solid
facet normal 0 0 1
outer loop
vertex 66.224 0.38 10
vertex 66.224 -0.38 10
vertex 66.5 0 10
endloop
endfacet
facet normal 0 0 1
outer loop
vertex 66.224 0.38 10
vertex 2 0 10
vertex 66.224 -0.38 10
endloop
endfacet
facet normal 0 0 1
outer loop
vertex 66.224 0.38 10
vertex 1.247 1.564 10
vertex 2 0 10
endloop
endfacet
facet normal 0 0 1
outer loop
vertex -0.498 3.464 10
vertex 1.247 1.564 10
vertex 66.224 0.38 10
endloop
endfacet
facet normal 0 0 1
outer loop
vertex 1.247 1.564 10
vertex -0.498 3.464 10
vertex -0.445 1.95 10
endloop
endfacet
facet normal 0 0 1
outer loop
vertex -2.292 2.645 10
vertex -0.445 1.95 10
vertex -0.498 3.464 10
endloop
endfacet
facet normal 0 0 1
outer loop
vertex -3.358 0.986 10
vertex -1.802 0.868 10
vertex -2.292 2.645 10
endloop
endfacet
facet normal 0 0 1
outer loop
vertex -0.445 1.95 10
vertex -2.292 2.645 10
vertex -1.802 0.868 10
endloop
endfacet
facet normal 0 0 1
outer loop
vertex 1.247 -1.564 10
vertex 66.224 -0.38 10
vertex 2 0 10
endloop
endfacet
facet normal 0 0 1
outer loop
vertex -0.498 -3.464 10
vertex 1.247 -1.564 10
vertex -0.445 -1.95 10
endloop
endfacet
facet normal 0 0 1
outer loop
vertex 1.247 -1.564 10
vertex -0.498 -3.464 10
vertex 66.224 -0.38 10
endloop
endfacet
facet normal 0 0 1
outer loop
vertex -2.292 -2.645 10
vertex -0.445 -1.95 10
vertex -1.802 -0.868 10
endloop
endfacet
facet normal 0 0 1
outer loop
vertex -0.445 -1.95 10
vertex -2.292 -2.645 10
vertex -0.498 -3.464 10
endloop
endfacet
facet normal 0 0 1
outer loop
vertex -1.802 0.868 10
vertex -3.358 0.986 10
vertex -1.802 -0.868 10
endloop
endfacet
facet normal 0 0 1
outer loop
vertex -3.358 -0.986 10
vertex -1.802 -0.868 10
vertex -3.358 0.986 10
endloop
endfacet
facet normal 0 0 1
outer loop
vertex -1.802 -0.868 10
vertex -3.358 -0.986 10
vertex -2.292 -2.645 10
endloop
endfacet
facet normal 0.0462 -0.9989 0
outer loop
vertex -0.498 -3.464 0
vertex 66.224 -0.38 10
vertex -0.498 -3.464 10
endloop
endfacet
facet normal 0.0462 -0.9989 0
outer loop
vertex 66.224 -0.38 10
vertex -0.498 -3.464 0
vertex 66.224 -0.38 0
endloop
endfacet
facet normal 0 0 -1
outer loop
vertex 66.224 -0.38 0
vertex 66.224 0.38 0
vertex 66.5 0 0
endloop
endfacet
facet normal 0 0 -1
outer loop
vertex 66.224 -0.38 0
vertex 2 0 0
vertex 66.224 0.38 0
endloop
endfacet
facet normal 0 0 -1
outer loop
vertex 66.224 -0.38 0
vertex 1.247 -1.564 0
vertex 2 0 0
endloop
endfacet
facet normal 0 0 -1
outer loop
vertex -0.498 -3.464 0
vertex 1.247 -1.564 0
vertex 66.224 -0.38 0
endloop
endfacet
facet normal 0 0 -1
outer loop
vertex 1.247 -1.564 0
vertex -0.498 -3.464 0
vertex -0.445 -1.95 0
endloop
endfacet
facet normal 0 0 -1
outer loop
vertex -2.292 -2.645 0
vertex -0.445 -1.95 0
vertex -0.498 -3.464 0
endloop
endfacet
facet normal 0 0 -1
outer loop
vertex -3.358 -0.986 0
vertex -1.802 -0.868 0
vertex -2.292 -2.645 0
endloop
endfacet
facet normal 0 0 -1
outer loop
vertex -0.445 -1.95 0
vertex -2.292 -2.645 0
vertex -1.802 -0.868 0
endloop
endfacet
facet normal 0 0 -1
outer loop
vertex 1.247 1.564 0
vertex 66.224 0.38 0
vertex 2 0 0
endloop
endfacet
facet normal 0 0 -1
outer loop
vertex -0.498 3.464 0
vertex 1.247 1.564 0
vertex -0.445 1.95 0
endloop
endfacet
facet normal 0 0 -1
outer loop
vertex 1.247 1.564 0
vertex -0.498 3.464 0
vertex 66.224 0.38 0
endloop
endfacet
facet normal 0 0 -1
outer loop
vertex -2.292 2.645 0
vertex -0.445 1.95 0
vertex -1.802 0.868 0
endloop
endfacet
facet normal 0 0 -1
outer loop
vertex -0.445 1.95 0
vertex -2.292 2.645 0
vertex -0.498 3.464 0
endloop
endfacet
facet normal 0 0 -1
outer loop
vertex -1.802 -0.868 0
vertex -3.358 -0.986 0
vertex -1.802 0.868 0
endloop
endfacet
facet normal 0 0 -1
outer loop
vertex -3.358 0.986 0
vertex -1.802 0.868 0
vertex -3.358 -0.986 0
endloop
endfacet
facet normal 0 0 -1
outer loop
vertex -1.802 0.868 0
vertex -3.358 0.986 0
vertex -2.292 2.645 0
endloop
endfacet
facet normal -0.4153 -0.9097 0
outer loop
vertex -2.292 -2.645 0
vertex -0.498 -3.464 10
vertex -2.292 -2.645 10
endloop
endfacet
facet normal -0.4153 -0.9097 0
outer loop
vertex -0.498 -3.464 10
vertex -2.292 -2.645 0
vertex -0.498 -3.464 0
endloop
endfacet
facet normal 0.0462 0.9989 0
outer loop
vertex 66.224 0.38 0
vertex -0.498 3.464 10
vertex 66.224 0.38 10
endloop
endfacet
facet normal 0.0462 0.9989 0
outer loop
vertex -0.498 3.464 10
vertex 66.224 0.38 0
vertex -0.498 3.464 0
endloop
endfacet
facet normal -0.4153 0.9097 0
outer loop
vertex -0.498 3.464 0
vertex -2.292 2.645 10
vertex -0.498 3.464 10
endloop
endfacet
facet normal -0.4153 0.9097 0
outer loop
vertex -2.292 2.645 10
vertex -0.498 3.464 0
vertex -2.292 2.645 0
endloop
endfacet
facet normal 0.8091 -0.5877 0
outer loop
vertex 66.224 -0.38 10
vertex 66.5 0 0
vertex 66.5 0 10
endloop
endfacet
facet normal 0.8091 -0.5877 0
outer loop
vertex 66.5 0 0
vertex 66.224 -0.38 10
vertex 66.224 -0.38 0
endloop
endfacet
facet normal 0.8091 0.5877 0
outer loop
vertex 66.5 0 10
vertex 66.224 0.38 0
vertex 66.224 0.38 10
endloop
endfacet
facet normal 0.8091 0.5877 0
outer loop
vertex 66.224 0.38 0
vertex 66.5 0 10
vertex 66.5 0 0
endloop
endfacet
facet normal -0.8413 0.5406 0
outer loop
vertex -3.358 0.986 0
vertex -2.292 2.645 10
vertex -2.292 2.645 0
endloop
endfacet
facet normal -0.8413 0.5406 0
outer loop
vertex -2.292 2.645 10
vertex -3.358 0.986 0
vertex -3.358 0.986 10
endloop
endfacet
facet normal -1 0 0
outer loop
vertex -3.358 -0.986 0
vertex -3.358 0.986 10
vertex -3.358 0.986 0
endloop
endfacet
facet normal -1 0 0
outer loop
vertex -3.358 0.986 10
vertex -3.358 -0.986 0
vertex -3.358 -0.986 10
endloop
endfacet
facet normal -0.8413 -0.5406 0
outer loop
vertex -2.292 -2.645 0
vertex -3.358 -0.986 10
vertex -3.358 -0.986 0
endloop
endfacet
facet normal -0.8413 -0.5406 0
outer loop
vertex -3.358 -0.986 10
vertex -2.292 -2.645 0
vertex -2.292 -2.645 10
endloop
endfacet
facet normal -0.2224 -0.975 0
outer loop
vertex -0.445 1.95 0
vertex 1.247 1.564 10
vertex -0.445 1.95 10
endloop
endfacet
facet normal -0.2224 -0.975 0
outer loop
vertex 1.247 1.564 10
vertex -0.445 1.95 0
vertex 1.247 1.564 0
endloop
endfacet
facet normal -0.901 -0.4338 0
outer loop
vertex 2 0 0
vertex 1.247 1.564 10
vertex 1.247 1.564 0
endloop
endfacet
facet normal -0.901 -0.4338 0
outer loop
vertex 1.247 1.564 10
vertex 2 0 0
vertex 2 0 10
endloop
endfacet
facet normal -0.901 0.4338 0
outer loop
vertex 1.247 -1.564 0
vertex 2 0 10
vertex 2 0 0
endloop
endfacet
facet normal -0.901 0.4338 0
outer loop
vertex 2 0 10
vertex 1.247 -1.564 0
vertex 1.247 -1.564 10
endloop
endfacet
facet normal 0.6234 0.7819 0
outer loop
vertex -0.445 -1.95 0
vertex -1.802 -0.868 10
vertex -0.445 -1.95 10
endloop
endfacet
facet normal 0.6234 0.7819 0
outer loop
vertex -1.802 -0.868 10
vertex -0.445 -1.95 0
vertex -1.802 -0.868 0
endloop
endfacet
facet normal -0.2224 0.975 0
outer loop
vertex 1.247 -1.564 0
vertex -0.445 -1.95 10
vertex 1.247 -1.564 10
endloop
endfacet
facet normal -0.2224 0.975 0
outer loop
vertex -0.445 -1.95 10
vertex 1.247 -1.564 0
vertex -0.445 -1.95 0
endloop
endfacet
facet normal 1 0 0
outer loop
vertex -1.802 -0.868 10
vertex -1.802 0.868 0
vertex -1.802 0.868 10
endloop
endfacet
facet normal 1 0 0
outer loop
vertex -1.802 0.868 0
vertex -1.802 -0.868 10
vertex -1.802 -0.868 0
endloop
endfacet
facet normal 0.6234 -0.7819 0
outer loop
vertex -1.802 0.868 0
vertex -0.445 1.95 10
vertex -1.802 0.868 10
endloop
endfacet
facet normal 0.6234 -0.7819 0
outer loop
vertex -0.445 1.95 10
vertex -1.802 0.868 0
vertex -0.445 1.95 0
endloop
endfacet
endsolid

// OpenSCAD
/// alle maten in milimeters 
/// Wouter 16-3-2016

hoogste = 7; //hoogste kant van de wig
lengte = 70; //lengte van de wig 
breedte = 10; //breedte van de wig
laagste = 0.8; //laagste kant van de wig
gaatje = 4;

difference (){
hull(){
cylinder(d=hoogste, h=breedte);
translate([lengte-(hoogste/2)-(laagste/2),0,0]) cylinder(d=laagste, h=breedte); 
}

translate ([0,0,-1]) cylinder (d=gaatje, h=breedte+2);
}
